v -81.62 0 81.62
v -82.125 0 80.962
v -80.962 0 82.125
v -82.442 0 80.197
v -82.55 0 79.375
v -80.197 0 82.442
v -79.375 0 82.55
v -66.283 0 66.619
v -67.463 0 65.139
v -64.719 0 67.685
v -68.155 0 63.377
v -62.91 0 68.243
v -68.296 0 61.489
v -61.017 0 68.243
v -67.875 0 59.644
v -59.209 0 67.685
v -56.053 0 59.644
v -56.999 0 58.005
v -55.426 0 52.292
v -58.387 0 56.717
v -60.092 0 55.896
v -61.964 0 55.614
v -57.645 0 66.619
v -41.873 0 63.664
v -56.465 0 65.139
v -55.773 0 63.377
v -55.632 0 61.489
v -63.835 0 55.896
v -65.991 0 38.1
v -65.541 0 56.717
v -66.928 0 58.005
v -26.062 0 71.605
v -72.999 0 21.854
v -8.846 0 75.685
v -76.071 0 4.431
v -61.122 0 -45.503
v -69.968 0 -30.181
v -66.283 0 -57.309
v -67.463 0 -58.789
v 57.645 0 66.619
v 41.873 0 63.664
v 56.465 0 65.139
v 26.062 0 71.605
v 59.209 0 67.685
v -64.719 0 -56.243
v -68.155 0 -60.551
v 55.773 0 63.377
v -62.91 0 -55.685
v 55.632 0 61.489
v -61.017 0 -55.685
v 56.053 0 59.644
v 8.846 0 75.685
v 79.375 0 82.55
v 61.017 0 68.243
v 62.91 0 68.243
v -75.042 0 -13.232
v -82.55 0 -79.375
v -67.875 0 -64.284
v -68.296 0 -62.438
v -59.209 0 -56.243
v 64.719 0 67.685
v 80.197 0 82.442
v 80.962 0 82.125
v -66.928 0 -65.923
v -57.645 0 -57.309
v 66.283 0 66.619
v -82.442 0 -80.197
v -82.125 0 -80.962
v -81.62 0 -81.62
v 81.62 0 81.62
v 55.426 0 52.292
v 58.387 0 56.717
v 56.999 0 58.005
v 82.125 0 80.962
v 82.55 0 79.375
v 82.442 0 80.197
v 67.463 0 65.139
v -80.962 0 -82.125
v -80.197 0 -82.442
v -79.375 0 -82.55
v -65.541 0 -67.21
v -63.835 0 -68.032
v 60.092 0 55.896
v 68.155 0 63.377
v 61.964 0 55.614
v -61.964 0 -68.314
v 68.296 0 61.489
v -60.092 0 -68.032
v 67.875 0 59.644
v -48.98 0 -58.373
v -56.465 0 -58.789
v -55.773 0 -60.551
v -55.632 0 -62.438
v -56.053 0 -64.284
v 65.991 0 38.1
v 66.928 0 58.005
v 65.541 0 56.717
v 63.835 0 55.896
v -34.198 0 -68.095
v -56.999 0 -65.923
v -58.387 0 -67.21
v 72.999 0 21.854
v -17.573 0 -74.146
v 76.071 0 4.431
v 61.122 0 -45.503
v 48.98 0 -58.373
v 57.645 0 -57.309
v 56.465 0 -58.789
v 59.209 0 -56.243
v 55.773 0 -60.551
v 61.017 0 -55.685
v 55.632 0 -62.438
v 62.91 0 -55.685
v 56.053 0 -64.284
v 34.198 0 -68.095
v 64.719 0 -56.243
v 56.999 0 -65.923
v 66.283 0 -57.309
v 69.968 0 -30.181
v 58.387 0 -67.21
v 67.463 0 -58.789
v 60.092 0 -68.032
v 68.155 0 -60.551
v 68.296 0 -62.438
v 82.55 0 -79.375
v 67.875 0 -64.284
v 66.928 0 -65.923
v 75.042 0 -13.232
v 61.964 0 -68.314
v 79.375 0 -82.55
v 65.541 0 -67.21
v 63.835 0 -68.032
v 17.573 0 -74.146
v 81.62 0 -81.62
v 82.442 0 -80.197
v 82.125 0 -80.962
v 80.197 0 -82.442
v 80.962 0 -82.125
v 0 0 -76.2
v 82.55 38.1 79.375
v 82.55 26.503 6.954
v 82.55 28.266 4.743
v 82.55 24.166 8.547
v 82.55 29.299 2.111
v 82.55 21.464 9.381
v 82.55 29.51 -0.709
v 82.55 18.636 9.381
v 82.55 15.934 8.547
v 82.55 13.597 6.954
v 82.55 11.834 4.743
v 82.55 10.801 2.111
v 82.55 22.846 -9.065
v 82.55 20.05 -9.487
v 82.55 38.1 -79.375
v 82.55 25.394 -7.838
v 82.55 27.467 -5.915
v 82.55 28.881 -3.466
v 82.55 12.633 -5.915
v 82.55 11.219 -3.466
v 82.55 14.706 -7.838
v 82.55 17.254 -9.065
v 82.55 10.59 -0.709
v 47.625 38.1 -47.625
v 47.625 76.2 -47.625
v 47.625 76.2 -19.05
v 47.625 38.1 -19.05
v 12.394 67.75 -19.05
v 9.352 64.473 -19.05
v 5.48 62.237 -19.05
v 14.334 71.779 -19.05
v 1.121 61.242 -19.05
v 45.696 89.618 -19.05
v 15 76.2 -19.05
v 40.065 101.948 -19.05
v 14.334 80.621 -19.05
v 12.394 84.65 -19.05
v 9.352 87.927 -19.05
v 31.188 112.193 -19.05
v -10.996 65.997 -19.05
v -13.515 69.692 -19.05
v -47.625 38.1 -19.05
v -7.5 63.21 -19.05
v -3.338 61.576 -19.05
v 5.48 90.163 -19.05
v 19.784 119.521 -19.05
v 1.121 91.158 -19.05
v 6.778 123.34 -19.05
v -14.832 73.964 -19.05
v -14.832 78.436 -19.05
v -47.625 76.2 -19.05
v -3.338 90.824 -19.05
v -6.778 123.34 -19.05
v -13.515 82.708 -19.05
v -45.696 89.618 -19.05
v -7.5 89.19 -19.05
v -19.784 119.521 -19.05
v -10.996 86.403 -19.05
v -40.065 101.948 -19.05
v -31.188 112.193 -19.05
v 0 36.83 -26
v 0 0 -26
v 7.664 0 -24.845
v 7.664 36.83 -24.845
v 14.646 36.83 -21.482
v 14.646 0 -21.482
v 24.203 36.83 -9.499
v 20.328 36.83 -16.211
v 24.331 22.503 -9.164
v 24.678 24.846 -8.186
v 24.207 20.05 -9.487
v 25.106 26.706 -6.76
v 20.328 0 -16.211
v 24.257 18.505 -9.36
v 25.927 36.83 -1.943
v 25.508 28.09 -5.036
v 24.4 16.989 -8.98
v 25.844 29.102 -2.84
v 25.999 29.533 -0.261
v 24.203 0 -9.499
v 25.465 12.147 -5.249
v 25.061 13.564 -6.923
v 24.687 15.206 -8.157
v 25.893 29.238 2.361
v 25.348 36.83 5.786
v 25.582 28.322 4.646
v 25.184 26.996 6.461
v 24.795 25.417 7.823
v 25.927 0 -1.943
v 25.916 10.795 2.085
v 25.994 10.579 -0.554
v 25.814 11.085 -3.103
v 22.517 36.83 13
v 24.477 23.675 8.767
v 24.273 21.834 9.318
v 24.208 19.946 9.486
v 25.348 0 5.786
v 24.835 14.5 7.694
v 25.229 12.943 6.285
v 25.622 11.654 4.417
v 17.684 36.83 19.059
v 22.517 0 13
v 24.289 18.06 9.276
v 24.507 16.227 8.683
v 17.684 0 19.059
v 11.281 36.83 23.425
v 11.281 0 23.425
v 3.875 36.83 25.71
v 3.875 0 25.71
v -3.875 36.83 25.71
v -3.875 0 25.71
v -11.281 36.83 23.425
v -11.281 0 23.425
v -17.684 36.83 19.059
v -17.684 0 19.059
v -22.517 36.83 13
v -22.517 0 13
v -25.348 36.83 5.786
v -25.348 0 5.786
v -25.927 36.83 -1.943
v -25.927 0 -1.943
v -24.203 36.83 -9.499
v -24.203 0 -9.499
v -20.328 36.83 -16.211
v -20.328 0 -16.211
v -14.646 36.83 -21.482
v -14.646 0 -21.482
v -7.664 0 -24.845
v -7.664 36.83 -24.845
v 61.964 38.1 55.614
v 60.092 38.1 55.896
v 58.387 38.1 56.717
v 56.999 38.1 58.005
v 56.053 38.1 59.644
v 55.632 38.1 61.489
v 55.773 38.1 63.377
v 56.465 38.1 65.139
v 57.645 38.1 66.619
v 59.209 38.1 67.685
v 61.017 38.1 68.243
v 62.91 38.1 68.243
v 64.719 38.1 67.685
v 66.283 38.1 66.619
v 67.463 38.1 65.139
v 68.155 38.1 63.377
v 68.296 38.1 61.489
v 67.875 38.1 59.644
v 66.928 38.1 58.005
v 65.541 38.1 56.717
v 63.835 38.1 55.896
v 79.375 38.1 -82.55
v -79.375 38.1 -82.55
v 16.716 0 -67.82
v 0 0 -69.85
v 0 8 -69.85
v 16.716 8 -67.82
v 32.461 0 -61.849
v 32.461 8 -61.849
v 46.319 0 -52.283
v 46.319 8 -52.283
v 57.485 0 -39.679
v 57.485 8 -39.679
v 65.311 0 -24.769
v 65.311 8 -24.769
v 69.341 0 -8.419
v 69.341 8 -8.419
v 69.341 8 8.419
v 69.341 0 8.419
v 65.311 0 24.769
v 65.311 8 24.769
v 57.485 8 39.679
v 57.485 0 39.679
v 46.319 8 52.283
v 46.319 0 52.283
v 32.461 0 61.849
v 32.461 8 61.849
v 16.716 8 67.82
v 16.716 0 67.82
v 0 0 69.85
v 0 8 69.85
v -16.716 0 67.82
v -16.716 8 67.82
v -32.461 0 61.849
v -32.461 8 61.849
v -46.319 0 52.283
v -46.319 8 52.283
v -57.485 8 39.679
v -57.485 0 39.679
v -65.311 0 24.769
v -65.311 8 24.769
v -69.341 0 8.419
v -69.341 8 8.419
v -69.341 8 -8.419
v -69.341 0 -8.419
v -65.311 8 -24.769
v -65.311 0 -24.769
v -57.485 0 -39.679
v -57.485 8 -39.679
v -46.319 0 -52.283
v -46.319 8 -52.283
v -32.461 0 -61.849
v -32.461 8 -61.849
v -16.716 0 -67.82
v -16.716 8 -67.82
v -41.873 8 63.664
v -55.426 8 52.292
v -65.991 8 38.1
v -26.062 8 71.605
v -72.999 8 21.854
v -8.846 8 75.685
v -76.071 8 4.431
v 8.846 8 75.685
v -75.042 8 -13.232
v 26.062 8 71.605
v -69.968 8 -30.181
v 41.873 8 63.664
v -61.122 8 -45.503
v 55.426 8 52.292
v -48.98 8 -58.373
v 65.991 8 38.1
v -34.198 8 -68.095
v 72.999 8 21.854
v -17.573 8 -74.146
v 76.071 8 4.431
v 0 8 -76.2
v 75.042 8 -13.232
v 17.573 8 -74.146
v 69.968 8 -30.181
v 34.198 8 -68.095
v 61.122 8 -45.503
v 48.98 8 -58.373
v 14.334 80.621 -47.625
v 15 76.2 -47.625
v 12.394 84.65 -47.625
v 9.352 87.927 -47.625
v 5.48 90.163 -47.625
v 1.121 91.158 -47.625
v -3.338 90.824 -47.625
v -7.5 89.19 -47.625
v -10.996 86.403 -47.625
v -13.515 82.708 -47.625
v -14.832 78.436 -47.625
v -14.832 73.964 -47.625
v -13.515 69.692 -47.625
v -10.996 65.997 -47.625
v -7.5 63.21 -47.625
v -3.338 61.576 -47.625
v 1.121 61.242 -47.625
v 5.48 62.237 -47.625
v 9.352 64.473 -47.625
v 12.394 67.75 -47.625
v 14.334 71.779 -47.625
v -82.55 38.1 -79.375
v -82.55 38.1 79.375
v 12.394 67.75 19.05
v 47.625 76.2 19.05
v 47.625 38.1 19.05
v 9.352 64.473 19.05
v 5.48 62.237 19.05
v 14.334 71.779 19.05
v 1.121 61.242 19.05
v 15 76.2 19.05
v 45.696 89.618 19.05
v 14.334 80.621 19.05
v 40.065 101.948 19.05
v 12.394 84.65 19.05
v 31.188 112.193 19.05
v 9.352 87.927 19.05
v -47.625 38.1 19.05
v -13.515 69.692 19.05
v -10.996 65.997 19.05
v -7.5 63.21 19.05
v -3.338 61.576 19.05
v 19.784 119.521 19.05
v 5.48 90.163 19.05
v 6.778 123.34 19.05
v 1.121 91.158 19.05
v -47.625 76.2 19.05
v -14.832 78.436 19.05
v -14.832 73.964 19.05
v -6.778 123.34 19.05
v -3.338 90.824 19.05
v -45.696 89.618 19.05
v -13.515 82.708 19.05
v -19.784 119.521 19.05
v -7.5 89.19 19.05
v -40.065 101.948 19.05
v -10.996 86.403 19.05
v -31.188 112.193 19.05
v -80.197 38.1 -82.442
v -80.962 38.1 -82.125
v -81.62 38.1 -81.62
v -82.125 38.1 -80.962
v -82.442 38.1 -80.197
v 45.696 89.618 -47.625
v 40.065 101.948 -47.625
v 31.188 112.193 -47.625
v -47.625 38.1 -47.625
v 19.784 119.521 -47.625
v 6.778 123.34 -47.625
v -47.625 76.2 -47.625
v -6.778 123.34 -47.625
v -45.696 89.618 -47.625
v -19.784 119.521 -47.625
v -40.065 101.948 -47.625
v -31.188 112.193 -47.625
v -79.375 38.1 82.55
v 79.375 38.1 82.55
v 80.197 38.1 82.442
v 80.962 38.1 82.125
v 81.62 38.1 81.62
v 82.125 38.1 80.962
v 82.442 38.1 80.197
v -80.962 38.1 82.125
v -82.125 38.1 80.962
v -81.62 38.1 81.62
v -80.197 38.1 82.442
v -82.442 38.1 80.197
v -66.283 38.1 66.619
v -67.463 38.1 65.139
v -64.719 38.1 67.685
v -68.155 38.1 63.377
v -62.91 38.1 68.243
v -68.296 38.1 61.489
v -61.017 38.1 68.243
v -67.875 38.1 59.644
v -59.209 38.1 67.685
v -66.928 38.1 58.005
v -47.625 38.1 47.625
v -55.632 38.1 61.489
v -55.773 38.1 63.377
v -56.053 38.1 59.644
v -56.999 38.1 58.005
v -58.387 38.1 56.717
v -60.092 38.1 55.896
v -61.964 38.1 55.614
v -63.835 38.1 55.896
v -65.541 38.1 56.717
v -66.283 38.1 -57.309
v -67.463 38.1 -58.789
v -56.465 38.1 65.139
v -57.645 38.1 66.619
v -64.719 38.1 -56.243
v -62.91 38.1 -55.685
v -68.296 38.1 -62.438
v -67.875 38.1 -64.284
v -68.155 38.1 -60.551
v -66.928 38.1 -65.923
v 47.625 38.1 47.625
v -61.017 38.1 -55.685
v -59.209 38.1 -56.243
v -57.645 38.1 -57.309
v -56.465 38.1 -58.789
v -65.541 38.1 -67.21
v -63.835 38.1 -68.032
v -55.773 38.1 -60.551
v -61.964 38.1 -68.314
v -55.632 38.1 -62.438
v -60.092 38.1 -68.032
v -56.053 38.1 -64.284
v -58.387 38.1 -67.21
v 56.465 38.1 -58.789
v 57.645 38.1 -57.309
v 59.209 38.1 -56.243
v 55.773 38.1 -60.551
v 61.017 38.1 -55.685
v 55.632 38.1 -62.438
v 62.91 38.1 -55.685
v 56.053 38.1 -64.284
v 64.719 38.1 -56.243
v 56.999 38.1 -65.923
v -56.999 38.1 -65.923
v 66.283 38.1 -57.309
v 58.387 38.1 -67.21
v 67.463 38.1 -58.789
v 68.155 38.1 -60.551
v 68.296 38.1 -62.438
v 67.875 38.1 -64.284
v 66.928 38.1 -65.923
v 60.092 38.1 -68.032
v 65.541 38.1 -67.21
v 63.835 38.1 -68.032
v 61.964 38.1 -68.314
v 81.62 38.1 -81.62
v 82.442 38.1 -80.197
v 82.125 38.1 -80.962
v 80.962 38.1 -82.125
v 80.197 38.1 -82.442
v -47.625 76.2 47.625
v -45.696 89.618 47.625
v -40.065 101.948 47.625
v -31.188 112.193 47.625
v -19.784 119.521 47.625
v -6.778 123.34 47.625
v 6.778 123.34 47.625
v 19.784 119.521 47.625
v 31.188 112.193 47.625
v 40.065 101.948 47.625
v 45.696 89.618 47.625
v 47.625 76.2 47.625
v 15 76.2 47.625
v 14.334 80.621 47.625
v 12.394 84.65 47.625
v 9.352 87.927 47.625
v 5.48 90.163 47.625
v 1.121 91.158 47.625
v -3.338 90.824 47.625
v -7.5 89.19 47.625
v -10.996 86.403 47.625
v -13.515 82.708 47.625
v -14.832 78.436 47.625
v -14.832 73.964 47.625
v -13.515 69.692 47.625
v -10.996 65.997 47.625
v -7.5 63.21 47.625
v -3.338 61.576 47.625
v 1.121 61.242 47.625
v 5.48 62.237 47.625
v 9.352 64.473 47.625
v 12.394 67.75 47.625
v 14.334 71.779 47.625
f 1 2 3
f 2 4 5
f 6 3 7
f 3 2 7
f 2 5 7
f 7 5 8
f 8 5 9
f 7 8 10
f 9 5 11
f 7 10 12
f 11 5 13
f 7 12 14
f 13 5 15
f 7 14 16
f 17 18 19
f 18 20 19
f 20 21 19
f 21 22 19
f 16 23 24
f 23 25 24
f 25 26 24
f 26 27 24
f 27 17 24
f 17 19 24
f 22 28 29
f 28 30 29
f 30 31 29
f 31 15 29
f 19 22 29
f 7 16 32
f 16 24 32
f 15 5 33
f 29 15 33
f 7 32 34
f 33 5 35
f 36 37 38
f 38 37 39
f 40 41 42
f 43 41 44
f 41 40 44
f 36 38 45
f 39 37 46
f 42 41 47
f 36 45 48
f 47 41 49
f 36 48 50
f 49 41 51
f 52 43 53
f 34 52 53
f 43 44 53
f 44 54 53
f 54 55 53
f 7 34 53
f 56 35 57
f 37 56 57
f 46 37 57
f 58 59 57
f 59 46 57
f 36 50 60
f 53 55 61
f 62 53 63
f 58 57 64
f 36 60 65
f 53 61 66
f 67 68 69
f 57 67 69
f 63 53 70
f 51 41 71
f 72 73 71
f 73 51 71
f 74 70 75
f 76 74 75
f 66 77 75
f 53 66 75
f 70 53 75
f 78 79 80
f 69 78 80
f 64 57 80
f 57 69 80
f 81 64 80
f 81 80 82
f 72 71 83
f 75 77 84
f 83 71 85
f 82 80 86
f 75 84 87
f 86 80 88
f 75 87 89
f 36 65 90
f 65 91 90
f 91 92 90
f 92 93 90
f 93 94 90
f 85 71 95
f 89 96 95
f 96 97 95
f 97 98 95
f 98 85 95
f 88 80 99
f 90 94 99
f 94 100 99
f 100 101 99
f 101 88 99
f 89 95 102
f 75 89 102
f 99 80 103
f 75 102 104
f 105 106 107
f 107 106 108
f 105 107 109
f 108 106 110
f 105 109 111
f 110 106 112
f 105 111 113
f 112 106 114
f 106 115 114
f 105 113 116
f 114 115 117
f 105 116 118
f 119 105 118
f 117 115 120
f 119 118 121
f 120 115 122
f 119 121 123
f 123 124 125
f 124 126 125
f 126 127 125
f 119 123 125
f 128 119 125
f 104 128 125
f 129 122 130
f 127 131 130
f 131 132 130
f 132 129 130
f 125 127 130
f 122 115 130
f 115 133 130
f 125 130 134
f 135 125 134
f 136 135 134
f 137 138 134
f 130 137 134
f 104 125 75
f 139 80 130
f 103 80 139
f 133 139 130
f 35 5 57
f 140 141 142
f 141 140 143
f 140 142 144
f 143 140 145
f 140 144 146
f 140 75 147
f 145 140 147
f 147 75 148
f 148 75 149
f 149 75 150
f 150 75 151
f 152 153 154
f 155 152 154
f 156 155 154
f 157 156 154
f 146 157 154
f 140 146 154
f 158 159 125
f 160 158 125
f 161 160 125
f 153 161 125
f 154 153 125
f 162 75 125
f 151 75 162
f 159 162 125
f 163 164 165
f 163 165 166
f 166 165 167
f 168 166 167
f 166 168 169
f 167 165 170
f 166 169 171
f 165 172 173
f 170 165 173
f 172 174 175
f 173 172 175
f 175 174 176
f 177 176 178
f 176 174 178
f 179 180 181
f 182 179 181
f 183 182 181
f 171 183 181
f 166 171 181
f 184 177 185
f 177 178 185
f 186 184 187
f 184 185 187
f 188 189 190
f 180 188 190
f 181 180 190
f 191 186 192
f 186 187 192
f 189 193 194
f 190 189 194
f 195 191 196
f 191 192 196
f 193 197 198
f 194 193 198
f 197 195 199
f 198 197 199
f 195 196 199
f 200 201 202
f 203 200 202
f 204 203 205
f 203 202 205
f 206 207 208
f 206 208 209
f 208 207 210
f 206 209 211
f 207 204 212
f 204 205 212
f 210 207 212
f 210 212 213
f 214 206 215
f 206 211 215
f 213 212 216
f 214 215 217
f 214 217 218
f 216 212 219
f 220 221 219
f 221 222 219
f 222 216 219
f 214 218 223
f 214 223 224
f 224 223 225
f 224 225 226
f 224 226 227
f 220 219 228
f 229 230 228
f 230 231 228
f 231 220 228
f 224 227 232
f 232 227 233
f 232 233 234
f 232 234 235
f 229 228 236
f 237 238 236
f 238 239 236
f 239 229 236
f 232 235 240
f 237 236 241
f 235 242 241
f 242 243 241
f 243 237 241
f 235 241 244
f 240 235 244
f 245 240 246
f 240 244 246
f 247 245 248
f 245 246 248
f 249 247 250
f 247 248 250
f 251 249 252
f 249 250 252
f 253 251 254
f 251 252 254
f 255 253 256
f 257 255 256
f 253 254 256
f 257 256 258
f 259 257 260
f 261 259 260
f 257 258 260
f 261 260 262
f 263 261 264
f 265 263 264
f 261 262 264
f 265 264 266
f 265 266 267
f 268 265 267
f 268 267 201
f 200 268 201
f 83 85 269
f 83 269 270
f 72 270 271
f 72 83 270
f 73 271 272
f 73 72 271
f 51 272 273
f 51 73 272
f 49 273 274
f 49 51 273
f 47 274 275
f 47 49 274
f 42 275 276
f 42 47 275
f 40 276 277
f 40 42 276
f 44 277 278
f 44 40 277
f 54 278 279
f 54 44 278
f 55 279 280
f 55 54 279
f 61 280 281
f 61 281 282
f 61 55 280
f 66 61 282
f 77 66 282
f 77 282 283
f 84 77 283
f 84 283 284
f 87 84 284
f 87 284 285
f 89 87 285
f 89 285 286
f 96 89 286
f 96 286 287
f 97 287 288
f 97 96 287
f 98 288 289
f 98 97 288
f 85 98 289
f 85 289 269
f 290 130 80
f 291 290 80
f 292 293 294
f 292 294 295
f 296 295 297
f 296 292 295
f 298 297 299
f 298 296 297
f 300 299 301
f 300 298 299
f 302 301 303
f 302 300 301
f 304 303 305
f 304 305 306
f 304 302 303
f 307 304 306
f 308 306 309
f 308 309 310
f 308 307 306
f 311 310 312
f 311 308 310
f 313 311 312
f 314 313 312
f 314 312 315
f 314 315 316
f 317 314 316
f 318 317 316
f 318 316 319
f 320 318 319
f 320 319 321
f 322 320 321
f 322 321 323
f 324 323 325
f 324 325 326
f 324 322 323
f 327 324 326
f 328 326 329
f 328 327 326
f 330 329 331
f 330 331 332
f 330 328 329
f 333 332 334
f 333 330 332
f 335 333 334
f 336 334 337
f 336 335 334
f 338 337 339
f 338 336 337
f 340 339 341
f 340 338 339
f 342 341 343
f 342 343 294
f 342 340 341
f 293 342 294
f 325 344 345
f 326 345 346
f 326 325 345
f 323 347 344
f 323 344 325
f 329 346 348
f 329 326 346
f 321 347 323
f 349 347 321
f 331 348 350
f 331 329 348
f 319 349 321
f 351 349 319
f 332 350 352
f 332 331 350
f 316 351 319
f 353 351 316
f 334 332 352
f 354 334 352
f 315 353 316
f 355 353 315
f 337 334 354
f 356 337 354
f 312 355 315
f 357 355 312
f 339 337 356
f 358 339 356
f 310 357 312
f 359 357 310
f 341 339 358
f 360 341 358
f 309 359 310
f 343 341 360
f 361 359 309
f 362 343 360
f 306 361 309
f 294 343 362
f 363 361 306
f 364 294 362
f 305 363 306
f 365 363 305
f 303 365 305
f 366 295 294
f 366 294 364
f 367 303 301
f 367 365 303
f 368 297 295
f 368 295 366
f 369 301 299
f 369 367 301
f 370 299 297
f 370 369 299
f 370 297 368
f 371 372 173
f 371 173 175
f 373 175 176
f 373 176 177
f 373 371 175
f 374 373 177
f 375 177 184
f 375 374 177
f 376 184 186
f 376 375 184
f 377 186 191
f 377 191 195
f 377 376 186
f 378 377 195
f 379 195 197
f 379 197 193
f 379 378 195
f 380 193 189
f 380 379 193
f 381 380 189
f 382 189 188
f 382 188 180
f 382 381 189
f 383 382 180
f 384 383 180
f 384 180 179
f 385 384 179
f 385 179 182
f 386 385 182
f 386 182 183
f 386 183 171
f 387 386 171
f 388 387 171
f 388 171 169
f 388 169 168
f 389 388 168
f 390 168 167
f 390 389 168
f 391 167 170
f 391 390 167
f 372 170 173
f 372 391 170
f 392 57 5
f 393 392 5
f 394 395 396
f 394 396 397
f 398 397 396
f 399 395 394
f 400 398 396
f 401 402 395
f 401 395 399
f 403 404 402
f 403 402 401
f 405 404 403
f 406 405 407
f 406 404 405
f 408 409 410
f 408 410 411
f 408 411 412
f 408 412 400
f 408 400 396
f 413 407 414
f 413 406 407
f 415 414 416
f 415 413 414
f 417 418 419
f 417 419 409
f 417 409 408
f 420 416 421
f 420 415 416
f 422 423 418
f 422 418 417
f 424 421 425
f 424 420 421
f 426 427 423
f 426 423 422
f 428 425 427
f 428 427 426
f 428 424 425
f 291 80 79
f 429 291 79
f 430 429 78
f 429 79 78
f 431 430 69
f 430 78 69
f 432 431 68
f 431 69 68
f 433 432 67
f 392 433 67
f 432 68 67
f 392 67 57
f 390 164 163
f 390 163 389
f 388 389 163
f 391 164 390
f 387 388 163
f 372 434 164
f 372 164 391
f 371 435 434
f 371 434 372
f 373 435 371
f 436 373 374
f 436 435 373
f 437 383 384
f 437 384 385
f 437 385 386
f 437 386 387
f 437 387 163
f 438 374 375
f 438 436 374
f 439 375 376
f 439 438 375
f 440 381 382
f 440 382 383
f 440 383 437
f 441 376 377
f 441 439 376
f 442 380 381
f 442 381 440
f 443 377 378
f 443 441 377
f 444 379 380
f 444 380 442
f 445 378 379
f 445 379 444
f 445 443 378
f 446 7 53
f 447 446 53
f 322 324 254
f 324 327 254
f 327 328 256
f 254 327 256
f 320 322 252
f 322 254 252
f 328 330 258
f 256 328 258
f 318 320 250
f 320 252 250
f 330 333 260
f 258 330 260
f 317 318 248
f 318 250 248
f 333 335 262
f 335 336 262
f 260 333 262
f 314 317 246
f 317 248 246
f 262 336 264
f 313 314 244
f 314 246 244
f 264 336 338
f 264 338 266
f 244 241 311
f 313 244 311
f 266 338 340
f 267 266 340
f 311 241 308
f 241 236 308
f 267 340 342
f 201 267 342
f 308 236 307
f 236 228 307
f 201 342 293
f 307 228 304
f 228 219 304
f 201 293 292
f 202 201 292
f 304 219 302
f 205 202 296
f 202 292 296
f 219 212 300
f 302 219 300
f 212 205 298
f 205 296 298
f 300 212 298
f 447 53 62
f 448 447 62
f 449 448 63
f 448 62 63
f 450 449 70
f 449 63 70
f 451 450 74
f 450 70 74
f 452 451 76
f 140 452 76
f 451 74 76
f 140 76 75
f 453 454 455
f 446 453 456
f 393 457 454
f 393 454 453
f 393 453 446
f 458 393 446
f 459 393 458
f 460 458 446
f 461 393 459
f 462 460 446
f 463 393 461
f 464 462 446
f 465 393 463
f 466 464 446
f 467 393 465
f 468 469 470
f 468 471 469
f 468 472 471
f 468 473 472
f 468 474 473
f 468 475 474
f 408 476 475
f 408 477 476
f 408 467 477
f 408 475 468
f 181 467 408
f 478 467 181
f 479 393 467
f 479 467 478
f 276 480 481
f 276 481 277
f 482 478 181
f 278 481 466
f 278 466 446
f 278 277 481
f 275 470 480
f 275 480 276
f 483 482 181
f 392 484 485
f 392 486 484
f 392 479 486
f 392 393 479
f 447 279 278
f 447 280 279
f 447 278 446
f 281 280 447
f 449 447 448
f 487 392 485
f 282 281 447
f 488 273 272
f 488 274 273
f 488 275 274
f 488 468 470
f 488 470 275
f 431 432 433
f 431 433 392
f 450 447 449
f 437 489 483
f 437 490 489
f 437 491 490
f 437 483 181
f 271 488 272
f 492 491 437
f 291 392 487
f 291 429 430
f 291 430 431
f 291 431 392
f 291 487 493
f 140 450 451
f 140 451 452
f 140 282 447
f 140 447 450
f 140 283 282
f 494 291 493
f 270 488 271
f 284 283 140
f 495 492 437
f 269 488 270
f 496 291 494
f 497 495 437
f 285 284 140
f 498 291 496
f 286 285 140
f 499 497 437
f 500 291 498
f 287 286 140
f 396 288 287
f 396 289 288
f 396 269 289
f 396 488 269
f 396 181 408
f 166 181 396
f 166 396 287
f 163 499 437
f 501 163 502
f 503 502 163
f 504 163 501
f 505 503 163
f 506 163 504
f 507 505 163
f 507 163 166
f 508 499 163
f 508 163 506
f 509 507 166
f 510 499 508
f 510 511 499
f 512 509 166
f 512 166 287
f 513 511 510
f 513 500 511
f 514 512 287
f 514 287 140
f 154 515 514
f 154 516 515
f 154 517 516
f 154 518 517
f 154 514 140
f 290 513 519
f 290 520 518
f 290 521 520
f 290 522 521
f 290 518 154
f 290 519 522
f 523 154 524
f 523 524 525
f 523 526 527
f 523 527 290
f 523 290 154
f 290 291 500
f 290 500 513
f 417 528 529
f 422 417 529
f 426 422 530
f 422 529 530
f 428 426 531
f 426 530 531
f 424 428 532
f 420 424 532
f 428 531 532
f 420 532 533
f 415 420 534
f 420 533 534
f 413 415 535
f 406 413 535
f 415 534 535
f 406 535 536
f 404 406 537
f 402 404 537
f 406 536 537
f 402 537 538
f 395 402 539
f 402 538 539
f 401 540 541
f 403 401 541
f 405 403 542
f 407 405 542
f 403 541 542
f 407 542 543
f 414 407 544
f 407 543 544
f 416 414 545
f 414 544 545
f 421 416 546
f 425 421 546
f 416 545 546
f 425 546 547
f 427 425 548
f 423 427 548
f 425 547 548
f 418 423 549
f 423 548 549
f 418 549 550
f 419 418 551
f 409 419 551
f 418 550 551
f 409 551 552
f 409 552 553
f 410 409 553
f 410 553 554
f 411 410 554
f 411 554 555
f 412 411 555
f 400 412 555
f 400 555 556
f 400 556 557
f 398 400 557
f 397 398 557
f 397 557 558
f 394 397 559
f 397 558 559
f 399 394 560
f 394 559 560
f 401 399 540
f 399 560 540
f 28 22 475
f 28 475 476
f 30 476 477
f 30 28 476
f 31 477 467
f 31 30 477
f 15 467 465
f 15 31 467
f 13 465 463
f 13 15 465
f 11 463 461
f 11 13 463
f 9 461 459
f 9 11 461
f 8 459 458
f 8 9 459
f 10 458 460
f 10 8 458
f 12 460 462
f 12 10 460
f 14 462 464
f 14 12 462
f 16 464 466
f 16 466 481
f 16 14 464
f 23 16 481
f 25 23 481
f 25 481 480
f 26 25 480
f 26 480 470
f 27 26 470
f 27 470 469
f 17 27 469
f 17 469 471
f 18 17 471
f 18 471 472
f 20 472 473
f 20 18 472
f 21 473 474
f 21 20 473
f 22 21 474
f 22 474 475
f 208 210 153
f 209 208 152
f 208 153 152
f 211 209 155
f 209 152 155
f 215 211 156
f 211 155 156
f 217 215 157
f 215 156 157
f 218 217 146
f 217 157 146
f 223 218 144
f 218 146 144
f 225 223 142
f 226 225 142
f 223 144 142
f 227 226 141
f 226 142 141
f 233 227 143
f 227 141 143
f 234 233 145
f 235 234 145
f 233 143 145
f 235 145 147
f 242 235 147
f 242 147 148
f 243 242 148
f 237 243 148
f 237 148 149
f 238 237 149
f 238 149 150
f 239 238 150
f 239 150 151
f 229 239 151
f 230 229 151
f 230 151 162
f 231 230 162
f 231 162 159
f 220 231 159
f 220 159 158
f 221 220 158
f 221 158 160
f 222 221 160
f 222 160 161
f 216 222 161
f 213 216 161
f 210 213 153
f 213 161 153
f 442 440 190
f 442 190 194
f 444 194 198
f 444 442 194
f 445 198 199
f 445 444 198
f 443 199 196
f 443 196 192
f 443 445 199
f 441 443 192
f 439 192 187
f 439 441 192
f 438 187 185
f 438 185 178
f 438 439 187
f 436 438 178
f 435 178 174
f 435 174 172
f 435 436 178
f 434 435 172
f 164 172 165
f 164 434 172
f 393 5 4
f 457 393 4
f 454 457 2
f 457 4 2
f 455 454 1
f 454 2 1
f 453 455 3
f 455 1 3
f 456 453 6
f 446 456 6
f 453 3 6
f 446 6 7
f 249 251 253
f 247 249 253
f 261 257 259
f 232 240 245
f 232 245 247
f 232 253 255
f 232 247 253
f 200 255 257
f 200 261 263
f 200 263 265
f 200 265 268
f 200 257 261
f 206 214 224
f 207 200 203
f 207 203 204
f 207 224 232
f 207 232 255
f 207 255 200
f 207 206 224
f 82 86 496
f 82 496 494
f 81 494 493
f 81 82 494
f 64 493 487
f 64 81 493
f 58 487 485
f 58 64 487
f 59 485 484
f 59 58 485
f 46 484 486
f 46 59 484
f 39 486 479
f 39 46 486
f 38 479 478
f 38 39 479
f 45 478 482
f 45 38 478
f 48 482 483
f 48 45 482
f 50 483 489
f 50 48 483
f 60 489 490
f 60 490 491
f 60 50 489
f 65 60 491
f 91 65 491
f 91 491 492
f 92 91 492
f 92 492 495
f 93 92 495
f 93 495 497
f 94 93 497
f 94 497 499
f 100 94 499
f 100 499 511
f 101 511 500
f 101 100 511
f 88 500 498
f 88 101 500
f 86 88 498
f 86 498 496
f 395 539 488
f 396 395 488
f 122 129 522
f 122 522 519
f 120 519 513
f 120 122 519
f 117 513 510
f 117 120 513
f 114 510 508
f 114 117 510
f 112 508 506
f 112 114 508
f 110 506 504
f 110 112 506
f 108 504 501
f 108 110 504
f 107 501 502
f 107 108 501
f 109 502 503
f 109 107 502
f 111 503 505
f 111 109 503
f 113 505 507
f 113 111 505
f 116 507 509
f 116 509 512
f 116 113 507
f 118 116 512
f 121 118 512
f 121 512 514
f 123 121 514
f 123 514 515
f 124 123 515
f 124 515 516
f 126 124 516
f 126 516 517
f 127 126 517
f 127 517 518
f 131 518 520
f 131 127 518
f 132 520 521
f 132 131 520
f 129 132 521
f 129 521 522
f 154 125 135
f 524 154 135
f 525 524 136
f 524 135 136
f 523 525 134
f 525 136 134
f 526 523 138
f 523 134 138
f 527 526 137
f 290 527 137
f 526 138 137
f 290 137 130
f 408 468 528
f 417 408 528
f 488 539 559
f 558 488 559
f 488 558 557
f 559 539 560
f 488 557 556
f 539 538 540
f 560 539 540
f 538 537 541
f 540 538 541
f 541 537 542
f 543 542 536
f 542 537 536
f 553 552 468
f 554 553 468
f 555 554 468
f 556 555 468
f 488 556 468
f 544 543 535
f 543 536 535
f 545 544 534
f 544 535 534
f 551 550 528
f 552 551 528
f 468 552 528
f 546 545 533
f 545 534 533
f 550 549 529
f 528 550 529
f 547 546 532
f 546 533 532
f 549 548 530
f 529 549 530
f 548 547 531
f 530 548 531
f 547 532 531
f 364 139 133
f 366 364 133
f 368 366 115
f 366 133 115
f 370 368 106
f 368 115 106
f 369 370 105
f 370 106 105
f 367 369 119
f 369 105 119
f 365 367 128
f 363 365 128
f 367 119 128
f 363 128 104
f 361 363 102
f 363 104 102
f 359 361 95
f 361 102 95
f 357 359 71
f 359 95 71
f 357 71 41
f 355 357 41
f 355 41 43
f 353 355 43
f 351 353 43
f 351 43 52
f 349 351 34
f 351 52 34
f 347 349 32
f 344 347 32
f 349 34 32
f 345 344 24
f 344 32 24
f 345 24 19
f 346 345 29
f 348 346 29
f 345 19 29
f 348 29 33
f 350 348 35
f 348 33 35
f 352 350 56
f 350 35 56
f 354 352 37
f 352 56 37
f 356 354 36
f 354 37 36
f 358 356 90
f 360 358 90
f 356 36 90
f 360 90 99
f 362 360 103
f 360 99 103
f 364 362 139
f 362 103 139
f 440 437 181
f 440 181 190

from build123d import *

# Parameters (mm, degrees)
SKETCH1_R                         = 6.35
BOSS_EXTRUDE1_DEPTH               = 38.1
BOSS_EXTRUDE2_START               = -34.925
SKETCH2_R                         = 15
BOSS_EXTRUDE2_DEPTH               = 28.575
SKETCH3_R                         = 26
CUT_EXTRUDE1_DEPTH                = 36.83
SKETCH4_R                         = 76.2
SKETCH4_R_2                       = 69.85
CUT_EXTRUDE2_DEPTH                = 8
F_1_2_14_NPSM_TAPPED_HOLE1_REACH  = 224.273
F_1_2_14_NPSM_TAPPED_HOLE1_BORE_R = 9.4869


with BuildPart() as part:
    # Sketch1 → Boss-Extrude1 (new body)
    with BuildSketch(Plane(origin=(0, 0, 0), x_dir=(1, 0, 0), z_dir=(0, 1, 0))):
        with BuildLine():
            Line((-79.375, -82.55), (79.375, -82.55))
            ThreePointArc((79.375, -82.55), (81.62006403, -81.62006403), (82.55, -79.375))
            Line((82.55, -79.375), (82.55, 79.375))
            ThreePointArc((82.55, 79.375), (81.62006403, 81.62006403), (79.375, 82.55))
            Line((79.375, 82.55), (-79.375, 82.55))
            ThreePointArc((-79.375, 82.55), (-81.62006403, 81.62006403), (-82.55, 79.375))
            Line((-82.55, 79.375), (-82.55, -79.375))
            ThreePointArc((-82.55, -79.375), (-81.62006403, -81.62006403), (-79.375, -82.55))
        make_face()
        with Locations(Location((61.963767235, 61.963767235, 0), (0, 0, 90))):
            Circle(SKETCH1_R, mode=Mode.SUBTRACT)
        with Locations(Location((61.963767235, -61.963767235, 0), (0, 0, 90))):
            Circle(SKETCH1_R, mode=Mode.SUBTRACT)
        with Locations(Location((-61.963767235, -61.963767235, 0), (0, 0, 90))):
            Circle(SKETCH1_R, mode=Mode.SUBTRACT)
        with Locations(Location((-61.963767235, 61.963767235, 0), (0, 0, 90))):
            Circle(SKETCH1_R, mode=Mode.SUBTRACT)
    extrude(amount=BOSS_EXTRUDE1_DEPTH)

    # Sketch2 → Boss-Extrude2 (add)
    with BuildSketch(Plane.XY.offset(82.55).offset(BOSS_EXTRUDE2_START)):
        with BuildLine():
            Line((-47.625, 38.1), (-47.625, 76.2))
            ThreePointArc((-47.625, 76.2), (0, 123.825), (47.625, 76.2))
            Line((47.625, 76.2), (47.625, 38.1))
            Line((47.625, 38.1), (-47.625, 38.1))
        make_face()
        with Locations((0, 76.2)):
            Circle(SKETCH2_R, mode=Mode.SUBTRACT)
    boss_extrude2 = extrude(amount=-BOSS_EXTRUDE2_DEPTH)

    # Mirror1: Boss-Extrude2 across plane
    add(boss_extrude2.mirror(Plane.XY))

    # Sketch3 → Cut-Extrude1 (cut)
    with BuildSketch(Plane.XZ):
        with Locations(Location((0, 0, 0), (0, 0, 270))):
            Circle(SKETCH3_R)
    extrude(amount=-CUT_EXTRUDE1_DEPTH, mode=Mode.SUBTRACT)

    # Sketch4 → Cut-Extrude2 (cut)
    with BuildSketch(Plane.XZ):
        with Locations(Location((0, 0, 0), (0, 0, 270))):
            Circle(SKETCH4_R)
        with Locations(Location((0, 0, 0), (0, 0, 270))):
            Circle(SKETCH4_R_2, mode=Mode.SUBTRACT)
    extrude(amount=-CUT_EXTRUDE2_DEPTH, mode=Mode.SUBTRACT)

    # 1/2-14 NPSM Tapped Hole1 bore → 1/2-14 NPSM Tapped Hole1 (cut, up to next)
    with BuildSketch(Plane(origin=(82.55, 0, 0), x_dir=(0, 0, -1), z_dir=(1, 0, 0)), mode=Mode.PRIVATE) as f_1_2_14_npsm_tapped_hole1_sk1:
        with Locations((0, 20.05)):
            Circle(F_1_2_14_NPSM_TAPPED_HOLE1_BORE_R)
    f_1_2_14_npsm_tapped_hole1_tool1 = extrude(f_1_2_14_npsm_tapped_hole1_sk1.sketch, amount=-F_1_2_14_NPSM_TAPPED_HOLE1_REACH, mode=Mode.PRIVATE) & part.part
    add(f_1_2_14_npsm_tapped_hole1_tool1.solids().sort_by_distance((82.55, 20.05, 0))[0], mode=Mode.SUBTRACT)


solid = part.part
